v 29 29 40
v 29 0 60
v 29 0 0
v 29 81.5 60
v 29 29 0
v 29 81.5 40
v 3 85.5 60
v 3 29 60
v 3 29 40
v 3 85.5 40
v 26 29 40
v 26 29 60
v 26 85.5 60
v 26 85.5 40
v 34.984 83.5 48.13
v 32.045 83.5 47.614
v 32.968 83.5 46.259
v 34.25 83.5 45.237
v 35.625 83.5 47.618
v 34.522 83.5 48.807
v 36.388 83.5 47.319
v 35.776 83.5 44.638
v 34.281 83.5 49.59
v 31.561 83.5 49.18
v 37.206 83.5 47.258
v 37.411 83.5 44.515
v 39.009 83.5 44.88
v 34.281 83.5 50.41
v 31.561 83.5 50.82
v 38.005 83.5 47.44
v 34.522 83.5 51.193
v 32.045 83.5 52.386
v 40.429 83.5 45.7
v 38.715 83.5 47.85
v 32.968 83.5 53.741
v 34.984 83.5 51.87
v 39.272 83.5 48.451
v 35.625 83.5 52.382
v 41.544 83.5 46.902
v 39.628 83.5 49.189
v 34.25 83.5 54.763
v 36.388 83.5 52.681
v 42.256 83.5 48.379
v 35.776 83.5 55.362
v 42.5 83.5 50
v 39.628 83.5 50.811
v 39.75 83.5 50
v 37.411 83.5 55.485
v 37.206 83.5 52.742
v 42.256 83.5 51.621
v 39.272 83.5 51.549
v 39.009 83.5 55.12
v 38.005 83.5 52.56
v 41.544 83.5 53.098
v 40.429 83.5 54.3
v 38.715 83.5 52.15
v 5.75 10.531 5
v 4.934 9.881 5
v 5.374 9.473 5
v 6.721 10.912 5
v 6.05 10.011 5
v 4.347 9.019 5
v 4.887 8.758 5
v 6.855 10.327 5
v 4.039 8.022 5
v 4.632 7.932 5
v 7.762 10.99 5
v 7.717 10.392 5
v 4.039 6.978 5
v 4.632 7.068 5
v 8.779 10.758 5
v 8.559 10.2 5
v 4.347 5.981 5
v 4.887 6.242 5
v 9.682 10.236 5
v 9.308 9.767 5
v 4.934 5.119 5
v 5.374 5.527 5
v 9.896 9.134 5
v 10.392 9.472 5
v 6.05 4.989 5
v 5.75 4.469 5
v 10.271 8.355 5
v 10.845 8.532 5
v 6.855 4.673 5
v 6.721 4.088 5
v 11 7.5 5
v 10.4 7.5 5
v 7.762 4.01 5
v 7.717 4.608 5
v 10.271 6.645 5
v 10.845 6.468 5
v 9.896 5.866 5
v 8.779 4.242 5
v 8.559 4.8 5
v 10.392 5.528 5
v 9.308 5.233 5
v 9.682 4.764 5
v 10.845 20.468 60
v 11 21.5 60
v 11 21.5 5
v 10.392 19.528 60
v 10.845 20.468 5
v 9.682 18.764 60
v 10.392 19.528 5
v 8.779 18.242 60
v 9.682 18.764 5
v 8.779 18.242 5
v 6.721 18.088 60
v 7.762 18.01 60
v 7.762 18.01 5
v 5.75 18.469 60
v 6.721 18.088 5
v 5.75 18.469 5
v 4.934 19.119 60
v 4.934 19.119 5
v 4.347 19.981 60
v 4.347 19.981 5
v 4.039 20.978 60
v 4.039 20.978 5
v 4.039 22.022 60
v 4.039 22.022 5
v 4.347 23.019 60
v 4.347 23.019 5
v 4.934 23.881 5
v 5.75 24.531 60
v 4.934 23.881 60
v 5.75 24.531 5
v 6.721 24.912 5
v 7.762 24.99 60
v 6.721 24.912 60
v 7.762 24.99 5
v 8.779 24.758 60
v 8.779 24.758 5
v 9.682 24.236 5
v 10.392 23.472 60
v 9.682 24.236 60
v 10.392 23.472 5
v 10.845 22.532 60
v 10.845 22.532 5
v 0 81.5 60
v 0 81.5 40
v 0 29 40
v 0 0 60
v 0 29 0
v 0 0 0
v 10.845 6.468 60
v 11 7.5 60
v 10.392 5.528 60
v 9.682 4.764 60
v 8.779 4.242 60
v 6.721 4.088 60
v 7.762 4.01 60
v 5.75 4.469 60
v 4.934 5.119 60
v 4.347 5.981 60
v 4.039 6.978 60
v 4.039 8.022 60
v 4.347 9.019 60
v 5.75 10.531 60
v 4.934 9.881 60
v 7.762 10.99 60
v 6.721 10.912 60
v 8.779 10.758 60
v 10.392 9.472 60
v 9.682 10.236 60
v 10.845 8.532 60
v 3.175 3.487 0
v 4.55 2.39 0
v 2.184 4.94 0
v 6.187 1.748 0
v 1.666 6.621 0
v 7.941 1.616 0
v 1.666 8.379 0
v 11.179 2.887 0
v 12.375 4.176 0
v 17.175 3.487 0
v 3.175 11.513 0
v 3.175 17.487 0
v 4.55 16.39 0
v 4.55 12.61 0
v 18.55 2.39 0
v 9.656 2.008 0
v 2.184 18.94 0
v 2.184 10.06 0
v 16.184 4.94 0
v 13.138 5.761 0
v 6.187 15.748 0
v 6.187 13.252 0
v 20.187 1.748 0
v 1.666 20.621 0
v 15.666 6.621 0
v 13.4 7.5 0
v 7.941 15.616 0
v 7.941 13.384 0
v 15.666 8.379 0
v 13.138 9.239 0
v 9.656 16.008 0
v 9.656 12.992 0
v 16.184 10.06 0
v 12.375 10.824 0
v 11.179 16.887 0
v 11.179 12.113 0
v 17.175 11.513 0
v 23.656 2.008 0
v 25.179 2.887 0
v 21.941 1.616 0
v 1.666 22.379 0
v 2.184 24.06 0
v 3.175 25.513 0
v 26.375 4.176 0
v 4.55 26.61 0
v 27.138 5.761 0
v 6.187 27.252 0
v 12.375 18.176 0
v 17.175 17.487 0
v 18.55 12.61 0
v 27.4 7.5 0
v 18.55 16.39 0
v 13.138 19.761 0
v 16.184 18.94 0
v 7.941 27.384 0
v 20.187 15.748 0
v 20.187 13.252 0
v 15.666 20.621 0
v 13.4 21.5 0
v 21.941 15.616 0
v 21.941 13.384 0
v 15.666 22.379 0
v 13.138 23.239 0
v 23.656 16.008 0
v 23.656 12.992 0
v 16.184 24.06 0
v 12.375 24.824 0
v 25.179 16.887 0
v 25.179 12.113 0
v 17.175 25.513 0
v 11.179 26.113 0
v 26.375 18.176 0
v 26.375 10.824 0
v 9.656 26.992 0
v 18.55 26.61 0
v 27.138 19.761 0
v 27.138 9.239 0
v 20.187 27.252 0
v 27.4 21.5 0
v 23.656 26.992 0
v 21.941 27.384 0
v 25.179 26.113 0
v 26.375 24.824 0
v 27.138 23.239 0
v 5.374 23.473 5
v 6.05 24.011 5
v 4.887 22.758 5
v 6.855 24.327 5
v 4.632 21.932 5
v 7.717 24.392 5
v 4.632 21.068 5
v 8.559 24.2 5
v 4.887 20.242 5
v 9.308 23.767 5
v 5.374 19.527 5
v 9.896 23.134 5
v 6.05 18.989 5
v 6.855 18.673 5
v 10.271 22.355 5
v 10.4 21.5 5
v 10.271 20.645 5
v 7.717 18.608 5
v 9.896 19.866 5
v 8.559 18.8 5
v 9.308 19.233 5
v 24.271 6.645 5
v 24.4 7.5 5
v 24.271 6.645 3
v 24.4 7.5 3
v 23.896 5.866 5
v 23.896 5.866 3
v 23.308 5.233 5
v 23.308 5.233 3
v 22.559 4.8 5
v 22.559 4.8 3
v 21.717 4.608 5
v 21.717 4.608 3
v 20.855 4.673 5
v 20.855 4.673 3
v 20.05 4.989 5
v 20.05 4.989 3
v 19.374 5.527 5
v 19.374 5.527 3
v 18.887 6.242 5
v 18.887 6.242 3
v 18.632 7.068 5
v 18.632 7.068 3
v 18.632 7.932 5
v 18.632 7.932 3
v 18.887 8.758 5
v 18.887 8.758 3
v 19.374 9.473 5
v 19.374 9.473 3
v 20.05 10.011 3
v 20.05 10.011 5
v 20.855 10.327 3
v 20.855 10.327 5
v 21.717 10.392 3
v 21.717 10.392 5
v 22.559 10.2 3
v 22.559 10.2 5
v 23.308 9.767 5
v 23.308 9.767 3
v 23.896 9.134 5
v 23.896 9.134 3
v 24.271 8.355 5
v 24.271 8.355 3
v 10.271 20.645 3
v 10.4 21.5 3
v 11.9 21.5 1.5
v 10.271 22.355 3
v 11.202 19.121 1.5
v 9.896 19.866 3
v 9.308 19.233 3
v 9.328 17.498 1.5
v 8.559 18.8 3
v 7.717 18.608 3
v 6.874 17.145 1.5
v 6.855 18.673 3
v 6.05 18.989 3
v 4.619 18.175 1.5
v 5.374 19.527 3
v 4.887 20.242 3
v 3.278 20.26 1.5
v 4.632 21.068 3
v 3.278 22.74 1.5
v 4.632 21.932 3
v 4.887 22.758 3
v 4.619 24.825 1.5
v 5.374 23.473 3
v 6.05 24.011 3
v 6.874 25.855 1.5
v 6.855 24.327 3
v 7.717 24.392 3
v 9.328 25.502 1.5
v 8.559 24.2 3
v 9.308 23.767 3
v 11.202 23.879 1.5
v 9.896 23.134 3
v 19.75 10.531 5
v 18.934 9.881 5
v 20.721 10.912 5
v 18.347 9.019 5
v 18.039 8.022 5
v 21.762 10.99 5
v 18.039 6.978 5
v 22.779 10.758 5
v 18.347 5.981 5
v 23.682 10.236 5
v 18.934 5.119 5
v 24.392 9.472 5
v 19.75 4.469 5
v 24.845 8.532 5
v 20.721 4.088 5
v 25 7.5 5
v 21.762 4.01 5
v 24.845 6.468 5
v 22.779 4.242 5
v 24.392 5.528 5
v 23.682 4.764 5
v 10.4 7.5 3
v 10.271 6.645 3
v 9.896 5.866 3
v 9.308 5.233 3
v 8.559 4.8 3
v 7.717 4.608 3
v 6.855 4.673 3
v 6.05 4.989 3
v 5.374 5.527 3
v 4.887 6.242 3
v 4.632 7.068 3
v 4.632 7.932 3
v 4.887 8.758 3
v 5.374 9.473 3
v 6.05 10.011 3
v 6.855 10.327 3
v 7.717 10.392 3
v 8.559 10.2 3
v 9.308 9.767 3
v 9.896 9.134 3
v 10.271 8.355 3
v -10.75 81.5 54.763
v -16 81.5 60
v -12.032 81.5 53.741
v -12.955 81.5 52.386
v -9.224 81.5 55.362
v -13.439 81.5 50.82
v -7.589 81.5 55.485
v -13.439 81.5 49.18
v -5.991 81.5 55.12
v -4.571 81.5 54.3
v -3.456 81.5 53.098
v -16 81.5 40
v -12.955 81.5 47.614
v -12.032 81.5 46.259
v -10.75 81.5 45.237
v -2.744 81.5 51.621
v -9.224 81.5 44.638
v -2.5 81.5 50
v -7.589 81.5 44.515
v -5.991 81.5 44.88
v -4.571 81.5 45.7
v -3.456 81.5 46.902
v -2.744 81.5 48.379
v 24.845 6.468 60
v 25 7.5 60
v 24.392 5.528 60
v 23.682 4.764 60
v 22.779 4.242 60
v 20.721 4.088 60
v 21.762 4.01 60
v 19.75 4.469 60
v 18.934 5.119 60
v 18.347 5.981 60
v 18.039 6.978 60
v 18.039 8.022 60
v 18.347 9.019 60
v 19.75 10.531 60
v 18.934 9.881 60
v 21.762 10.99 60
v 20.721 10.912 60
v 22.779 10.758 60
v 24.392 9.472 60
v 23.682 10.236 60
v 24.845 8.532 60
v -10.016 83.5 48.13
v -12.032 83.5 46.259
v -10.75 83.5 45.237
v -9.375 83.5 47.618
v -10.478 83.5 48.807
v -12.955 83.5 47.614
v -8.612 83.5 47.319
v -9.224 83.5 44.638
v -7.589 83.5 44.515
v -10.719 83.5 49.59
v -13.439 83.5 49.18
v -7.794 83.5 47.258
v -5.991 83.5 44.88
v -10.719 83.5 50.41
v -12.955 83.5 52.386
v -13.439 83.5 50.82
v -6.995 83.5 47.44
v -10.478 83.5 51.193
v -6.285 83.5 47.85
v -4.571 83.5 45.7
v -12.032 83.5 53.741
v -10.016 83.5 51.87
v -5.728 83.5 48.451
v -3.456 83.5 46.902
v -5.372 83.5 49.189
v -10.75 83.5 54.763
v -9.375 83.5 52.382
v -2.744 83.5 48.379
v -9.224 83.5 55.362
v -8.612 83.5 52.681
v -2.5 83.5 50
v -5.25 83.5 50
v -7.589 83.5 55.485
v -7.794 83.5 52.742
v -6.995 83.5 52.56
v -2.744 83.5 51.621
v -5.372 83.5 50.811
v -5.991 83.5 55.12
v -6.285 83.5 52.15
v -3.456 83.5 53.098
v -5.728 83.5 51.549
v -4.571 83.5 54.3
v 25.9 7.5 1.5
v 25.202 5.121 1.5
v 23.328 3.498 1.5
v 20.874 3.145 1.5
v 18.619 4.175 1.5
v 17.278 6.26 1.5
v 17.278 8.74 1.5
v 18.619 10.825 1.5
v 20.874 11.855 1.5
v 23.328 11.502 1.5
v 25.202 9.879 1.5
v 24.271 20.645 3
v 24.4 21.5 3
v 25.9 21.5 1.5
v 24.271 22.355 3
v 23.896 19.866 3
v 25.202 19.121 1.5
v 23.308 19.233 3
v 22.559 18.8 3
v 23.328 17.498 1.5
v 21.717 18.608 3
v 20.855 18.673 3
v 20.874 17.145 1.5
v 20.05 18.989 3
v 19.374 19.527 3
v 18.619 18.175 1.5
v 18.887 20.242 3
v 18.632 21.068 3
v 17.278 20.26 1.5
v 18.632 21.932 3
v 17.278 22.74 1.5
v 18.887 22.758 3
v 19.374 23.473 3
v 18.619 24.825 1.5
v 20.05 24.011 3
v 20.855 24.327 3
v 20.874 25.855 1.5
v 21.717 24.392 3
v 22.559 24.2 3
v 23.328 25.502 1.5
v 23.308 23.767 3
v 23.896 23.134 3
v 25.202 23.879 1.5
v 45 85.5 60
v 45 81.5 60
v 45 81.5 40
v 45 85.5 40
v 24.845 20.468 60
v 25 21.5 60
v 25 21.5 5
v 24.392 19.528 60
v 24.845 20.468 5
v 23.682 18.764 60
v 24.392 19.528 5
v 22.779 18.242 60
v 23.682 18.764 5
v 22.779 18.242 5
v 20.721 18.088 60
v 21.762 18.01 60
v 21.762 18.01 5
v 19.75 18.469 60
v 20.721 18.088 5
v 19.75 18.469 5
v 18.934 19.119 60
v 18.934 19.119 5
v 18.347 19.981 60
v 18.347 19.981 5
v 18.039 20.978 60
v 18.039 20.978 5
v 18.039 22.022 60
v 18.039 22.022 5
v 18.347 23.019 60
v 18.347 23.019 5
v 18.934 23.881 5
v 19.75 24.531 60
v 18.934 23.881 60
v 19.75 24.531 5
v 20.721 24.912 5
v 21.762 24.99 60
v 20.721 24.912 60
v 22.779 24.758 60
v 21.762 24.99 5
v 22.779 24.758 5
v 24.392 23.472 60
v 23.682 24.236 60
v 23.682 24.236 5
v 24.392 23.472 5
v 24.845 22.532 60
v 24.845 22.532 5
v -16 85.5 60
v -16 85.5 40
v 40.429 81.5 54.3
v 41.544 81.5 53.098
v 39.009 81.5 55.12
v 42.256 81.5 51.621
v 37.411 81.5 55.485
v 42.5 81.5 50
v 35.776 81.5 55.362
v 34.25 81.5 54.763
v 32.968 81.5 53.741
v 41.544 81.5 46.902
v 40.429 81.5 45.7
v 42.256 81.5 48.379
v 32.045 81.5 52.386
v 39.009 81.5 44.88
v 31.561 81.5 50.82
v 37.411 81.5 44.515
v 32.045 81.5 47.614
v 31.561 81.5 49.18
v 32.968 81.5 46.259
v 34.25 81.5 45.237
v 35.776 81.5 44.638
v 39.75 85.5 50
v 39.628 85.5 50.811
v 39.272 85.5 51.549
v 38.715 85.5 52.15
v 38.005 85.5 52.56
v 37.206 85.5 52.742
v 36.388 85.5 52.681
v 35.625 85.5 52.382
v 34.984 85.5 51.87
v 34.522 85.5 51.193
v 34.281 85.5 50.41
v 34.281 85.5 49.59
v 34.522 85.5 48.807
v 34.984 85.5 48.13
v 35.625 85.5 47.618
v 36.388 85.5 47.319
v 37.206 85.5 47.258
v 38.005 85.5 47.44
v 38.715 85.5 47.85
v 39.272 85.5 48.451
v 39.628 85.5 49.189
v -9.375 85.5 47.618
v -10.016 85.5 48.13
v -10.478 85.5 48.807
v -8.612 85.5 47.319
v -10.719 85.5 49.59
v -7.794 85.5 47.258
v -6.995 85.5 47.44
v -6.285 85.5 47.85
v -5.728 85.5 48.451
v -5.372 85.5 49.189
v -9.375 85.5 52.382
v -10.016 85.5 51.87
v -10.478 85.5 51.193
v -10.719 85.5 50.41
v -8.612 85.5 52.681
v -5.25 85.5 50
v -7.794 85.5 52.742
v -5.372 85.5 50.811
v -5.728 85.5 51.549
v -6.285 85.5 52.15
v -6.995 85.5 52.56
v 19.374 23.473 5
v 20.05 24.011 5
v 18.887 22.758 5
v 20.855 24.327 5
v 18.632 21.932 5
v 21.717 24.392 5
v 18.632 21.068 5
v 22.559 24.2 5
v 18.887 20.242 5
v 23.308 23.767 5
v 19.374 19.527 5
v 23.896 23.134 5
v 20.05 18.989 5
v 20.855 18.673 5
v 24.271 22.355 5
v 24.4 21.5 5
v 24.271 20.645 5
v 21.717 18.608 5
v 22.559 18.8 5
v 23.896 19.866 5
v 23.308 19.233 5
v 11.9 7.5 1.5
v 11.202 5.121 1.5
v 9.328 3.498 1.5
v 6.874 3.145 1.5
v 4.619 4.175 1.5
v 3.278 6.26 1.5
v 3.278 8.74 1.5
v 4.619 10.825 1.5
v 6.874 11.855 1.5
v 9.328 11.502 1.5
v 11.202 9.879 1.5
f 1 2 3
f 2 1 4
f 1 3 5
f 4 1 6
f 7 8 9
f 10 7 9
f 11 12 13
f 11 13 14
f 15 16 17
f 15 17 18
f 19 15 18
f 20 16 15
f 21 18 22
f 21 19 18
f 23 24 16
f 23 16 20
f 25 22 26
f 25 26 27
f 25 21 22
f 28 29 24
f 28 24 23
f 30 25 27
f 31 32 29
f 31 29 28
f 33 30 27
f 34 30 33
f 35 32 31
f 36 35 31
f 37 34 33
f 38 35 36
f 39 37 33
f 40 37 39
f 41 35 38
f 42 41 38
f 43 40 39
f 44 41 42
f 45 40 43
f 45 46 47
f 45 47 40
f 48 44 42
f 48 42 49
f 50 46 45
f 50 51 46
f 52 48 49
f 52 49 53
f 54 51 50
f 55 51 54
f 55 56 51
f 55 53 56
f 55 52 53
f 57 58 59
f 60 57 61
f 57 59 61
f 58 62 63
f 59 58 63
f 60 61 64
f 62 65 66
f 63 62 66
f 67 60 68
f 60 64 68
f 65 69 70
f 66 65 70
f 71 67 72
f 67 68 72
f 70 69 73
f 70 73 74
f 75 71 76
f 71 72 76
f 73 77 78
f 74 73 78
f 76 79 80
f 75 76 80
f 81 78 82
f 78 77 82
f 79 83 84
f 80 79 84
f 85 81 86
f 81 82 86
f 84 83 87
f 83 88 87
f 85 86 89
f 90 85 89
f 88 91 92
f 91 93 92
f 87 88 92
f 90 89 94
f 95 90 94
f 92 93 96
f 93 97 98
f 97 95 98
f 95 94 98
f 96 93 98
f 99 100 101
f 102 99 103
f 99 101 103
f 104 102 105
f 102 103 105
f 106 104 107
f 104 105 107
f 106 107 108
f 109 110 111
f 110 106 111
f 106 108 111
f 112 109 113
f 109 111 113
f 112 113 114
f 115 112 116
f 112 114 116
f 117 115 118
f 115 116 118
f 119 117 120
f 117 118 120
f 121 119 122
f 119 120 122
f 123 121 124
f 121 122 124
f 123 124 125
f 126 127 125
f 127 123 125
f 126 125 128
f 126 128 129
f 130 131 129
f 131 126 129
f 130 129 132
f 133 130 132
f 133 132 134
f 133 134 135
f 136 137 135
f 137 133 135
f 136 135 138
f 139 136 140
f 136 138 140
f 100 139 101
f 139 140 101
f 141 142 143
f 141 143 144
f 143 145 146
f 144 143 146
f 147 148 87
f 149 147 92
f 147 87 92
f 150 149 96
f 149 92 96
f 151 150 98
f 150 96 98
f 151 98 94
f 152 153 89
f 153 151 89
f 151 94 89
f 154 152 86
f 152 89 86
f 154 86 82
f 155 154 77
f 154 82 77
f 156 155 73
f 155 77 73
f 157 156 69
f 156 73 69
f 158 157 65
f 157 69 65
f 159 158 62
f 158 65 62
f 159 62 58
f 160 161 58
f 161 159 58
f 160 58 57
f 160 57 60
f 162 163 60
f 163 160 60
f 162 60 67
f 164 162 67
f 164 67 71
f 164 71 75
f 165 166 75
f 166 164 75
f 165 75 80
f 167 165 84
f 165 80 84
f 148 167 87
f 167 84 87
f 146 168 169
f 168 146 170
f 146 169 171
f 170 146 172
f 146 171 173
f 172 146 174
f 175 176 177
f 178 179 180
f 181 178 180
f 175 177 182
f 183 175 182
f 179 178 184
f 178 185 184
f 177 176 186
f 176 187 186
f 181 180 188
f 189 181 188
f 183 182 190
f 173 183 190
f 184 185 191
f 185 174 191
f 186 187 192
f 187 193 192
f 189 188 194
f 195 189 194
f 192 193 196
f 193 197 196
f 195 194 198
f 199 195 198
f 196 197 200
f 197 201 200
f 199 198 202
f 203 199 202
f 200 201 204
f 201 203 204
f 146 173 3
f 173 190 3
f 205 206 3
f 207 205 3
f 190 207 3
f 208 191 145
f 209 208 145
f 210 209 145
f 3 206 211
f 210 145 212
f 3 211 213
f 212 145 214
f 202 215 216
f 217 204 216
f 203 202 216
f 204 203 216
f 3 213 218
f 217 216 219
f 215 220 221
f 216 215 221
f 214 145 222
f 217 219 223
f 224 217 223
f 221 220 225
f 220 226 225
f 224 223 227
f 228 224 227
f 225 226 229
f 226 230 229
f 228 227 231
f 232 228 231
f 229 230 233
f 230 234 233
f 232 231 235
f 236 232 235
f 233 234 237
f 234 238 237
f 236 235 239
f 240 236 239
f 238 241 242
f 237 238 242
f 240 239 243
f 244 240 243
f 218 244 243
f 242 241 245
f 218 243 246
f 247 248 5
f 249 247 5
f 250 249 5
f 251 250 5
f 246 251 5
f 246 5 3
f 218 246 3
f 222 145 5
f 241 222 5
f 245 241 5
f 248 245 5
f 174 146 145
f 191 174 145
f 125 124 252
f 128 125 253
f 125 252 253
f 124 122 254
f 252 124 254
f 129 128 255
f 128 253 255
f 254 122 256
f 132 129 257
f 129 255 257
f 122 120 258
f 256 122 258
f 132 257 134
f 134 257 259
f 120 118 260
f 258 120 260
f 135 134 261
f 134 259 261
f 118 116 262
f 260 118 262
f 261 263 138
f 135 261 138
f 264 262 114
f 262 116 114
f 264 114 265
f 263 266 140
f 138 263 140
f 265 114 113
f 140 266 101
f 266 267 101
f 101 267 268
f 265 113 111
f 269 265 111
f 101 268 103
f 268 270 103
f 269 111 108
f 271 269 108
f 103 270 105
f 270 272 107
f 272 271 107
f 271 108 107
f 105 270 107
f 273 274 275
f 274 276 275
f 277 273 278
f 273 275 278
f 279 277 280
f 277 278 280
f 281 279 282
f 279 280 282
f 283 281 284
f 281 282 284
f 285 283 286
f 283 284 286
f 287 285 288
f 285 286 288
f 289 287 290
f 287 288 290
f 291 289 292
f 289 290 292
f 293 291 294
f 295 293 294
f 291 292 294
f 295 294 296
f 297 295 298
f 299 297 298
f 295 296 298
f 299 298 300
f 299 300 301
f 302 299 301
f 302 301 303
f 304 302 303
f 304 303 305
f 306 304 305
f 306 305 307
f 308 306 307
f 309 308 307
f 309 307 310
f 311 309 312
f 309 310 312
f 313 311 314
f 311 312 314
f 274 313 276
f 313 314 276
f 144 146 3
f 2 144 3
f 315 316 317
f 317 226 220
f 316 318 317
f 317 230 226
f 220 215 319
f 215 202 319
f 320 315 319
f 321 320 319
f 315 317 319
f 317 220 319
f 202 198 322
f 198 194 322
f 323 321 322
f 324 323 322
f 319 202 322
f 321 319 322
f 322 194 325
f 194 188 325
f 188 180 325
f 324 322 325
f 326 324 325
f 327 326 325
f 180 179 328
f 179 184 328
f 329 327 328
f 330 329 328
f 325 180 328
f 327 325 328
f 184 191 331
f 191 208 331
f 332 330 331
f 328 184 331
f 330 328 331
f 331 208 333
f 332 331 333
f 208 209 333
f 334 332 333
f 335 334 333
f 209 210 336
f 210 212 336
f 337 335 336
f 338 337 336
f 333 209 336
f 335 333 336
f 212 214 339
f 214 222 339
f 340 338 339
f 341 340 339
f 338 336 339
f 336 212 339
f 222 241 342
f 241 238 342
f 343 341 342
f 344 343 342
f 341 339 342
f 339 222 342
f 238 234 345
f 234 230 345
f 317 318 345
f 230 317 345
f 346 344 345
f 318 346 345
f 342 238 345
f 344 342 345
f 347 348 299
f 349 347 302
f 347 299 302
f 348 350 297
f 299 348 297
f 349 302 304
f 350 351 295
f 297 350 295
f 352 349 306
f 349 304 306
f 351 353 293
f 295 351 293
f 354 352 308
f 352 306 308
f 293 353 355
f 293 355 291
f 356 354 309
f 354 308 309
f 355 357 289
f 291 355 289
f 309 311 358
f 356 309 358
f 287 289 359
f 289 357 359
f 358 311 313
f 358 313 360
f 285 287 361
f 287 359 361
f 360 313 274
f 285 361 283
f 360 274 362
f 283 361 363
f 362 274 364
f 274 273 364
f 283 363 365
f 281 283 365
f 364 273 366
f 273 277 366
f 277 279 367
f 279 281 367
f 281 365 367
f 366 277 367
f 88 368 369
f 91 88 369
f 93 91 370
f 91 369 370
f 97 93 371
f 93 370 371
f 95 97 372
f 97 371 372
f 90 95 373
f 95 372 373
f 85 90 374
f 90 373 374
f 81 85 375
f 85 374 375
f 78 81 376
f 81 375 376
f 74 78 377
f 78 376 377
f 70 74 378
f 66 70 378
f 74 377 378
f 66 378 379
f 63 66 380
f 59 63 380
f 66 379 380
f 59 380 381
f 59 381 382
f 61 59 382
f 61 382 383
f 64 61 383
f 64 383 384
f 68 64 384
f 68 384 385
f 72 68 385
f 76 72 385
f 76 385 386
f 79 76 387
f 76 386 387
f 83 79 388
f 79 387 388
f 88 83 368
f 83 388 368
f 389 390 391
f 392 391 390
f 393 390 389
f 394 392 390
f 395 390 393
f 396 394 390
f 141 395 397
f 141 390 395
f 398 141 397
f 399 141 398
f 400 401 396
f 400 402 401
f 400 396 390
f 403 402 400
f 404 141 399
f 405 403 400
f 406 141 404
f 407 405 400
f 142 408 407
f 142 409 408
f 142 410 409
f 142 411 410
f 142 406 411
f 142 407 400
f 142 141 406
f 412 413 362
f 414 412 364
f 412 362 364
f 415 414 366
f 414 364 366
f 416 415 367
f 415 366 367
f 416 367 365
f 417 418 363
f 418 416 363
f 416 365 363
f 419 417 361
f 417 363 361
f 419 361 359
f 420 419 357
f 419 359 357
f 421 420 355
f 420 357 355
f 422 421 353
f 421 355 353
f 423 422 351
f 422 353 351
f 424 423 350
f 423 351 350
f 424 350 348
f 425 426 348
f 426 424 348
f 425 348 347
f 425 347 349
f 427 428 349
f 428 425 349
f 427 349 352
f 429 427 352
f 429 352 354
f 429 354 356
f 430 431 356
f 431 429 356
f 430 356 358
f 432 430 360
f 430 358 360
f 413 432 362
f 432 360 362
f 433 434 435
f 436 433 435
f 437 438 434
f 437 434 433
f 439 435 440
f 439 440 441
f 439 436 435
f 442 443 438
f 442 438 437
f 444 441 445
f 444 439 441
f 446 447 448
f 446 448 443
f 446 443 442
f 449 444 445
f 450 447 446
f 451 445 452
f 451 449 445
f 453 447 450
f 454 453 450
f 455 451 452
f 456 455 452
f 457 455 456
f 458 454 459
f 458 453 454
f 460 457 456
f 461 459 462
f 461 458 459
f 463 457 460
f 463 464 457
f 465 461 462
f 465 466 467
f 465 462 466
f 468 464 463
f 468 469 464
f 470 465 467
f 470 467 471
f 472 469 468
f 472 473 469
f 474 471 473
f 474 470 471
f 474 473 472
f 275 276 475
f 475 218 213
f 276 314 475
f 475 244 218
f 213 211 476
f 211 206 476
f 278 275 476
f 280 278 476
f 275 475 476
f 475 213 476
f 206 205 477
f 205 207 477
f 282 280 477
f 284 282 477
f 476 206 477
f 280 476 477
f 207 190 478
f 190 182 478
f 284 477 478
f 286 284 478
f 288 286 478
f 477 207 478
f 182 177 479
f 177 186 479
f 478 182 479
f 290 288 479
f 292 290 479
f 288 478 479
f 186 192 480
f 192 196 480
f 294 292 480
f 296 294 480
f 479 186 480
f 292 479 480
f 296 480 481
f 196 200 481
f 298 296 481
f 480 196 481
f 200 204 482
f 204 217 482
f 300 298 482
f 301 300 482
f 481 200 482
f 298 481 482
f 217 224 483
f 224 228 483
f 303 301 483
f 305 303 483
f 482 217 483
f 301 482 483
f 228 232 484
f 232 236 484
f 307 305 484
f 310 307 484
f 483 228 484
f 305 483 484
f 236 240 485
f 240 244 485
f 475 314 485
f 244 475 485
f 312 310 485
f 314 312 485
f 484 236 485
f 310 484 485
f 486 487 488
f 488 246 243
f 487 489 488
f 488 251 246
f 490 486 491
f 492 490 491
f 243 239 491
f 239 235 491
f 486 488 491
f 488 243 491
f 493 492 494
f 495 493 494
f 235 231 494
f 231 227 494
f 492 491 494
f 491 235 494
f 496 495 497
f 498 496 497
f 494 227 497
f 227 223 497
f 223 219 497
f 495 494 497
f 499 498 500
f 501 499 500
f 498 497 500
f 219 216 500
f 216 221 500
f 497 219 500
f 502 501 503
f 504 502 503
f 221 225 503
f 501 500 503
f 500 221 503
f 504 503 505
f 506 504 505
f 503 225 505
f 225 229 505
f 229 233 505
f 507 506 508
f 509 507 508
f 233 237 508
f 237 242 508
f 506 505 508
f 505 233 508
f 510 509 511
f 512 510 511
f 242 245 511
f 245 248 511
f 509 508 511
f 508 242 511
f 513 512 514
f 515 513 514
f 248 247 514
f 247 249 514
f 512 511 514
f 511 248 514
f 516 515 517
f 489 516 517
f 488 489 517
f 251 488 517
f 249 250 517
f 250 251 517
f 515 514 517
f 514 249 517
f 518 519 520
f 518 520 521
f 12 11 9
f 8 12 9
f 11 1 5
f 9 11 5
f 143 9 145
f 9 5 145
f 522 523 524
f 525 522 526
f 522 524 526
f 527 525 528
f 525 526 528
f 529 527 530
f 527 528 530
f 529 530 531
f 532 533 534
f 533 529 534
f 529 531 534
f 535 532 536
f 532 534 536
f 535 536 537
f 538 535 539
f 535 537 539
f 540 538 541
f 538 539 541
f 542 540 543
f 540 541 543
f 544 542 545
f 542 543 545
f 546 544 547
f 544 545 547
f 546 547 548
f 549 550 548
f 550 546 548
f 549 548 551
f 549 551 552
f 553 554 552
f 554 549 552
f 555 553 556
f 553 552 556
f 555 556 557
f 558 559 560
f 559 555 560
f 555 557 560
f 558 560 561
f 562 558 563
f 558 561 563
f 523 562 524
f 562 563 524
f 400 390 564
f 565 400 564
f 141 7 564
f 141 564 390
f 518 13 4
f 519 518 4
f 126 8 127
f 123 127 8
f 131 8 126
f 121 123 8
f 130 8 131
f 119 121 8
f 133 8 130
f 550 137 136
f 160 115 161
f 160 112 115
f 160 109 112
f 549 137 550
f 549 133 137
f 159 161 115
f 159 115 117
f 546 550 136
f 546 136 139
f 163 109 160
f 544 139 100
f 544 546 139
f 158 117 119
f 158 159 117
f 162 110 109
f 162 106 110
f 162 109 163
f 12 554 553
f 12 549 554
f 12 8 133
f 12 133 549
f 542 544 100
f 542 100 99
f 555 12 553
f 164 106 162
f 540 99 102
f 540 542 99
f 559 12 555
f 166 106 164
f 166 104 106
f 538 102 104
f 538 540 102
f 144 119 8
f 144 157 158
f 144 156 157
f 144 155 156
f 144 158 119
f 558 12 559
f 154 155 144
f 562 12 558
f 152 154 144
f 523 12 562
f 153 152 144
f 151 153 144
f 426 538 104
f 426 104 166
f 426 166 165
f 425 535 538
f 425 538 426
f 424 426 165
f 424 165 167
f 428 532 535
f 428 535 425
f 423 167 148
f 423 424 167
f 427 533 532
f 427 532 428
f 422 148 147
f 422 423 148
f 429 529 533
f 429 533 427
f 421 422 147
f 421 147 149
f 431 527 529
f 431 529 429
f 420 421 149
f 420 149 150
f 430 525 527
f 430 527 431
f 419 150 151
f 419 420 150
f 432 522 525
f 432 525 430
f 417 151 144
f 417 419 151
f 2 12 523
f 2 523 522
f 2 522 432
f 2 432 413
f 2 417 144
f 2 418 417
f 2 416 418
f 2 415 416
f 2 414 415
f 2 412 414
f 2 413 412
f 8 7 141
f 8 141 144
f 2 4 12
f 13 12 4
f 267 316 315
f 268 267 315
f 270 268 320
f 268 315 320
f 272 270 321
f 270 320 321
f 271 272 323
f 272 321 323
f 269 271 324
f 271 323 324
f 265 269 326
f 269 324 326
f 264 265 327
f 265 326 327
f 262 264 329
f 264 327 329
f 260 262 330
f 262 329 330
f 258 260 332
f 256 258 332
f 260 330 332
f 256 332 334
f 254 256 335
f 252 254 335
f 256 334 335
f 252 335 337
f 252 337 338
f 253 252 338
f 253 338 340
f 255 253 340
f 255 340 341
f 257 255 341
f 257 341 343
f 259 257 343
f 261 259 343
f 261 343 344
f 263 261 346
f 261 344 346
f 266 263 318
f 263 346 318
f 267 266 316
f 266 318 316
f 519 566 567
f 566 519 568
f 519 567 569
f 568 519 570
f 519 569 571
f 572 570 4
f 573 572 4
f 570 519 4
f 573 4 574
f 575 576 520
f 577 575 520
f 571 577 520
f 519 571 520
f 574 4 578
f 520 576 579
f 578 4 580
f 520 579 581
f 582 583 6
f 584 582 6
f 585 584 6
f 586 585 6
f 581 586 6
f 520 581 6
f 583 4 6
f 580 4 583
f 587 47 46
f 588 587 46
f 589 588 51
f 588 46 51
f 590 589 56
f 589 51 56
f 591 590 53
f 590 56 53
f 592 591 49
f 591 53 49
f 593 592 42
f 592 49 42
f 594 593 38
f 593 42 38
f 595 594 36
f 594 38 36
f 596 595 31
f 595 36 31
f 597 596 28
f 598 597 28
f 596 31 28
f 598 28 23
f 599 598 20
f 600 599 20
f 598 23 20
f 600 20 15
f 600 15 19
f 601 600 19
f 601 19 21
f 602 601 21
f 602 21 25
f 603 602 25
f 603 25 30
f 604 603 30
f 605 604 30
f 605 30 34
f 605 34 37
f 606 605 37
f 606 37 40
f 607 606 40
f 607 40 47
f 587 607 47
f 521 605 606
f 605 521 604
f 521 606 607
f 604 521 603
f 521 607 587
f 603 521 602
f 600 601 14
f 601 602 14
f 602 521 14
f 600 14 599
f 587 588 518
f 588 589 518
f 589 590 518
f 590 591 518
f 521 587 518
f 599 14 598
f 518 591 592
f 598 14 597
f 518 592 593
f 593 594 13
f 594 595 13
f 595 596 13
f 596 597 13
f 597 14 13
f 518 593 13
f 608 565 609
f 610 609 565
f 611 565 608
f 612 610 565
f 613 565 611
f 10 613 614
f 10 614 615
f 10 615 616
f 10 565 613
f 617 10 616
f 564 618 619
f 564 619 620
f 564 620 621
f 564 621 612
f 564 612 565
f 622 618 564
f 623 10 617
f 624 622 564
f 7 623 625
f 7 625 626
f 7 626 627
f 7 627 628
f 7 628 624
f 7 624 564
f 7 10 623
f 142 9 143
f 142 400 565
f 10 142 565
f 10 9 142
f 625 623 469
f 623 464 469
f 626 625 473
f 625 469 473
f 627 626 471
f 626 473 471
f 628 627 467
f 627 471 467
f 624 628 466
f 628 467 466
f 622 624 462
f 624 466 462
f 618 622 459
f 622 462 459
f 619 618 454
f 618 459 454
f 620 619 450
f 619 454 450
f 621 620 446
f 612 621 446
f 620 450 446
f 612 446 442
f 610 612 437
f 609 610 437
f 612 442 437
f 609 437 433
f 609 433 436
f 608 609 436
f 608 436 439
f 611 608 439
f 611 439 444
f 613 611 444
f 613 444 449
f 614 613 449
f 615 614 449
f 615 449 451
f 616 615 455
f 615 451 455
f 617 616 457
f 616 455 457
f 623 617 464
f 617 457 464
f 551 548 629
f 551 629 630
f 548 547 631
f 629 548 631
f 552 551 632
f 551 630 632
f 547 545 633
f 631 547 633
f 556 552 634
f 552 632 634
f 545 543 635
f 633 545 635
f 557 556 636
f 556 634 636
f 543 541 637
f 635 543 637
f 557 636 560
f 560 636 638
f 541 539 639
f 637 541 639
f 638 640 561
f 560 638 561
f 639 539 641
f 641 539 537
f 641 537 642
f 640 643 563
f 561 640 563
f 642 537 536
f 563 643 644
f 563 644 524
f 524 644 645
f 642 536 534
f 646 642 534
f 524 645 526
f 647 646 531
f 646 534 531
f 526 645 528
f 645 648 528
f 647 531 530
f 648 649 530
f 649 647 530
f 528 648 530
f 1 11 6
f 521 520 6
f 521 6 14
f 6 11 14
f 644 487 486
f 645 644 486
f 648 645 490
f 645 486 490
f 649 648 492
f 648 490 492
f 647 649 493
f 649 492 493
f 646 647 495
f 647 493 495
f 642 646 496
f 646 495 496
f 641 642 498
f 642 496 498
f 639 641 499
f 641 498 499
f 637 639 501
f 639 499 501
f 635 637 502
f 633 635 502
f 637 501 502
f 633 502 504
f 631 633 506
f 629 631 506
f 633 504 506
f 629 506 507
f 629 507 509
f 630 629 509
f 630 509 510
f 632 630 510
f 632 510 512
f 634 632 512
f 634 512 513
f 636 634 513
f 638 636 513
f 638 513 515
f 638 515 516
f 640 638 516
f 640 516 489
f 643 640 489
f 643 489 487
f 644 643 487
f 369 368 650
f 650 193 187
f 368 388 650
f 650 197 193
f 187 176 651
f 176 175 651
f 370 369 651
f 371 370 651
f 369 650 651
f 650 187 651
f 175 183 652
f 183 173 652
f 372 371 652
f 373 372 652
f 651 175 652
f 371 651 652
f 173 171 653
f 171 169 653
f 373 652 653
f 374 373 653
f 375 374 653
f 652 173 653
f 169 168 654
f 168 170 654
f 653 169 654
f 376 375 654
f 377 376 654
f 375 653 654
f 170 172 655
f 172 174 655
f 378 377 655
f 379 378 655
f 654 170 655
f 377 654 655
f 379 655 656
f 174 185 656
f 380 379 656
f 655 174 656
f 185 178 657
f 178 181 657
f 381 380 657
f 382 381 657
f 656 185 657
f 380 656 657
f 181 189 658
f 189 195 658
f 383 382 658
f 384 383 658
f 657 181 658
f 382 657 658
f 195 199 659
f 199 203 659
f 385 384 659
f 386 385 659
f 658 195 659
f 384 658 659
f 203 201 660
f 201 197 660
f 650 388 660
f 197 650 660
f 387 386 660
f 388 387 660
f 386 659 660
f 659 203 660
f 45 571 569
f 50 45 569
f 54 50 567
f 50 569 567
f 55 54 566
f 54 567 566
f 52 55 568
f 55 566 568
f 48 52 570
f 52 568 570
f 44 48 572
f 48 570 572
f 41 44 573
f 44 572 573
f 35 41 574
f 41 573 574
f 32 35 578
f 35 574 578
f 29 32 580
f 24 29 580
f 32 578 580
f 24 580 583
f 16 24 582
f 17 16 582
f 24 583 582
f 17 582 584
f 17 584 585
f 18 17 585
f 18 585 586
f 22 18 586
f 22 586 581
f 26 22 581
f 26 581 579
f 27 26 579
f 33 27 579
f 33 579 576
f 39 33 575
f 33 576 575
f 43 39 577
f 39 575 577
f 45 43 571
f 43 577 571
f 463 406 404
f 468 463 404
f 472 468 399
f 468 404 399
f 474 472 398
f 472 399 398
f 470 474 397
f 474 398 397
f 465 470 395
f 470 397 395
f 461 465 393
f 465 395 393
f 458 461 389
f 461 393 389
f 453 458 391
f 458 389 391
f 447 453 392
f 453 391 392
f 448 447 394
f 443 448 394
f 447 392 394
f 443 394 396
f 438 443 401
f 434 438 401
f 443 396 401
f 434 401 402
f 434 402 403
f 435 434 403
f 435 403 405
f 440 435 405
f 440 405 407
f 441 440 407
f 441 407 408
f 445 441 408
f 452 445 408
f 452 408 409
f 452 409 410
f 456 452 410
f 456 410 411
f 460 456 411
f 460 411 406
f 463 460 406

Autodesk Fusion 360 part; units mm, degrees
sketch "Sketch1" plane through (0, 0, 0) normal (0, 0, 1) x (1, 0, 0) in component "Halterung"
  line L0 (0, 0) -> (29, 0)
  line L1 (29, 0) -> (29, 29)
  line L2 (29, 29) -> (0, 29)
  line L3 (0, 29) -> (0, 0)
  circle A0 centre (7.5, 7.5) radius 3.5
  circle A1 centre (21.5, 7.5) radius 3.5
  circle A2 centre (7.5, 21.5) radius 3.5
  circle A3 centre (21.5, 21.5) radius 3.5
  dimension "d1" = 7
  dimension "d3" = 4
  dimension "d6" = 7
  dimension "d7" = 4
  dimension "d8" = 7
  dimension "d9" = 4
  dimension "d10" = 4
  dimension "d15" = 35
extrude "Extrude1" add sketch "Sketch1" along normal blind 60 in component "Halterung"
sketch "Sketch2" plane through (0, 29, 0) normal (0, 1, 0) x (-1, 0, 0) in component "Halterung"
  line L0 (-29, 0) -> (0, 0)
  line L1 (0, 0) -> (0, 60)
  line L2 (0, 60) -> (-29, 60)
  line L3 (-29, 60) -> (-29, 0)
  line L4 (-29, 60) -> (-26, 60)
  line L5 (-26, 60) -> (-26, 40)
  line L6 (-26, 40) -> (-29, 40)
  line L7 (-29, 40) -> (-29, 60)
  line L8 (-14.5, 60) -> (-14.5, 0) construction
  line L9 (-3, 60) -> (-3, 40)
  line L10 (0, 60) -> (-3, 60)
  line L11 (0, 40) -> (0, 60)
  line L12 (-3, 40) -> (0, 40)
  dimension "d13" = 3
  dimension "d14" = 20
extrude "Extrude2" add sketch "Sketch2" along normal blind 56.5 contours L2 L3 L4 L5 L6 L7 | L1 L2 L9 L10 L11 L12 in component "Halterung"
sketch "Sketch3" plane through (29, 0, 0) normal (1, 0, 0) x (0, 1, 0) in component "Halterung"
  line L0 (0, 0) -> (29, 0)
  line L1 (29, 0) -> (29, 40)
  line L2 (29, 40) -> (85.5, 40)
  line L3 (85.5, 40) -> (85.5, 60)
  line L4 (85.5, 60) -> (0, 60)
  line L5 (0, 60) -> (0, 0)
  line L6 (85.5, 60) -> (81.5, 60)
  line L7 (81.5, 60) -> (81.5, 40)
  line L8 (81.5, 40) -> (85.5, 40)
  line L9 (85.5, 40) -> (85.5, 60)
  dimension "d18" = 4
extrude "Extrude3" add sketch "Sketch3" along normal blind 16 contours L2 L3 L4 L6 L7 L8 L9 in component "Halterung"
extrude "Extrude4" add sketch "Sketch3" against normal blind 16 from surface at -29 contours L2 L3 L4 L6 L7 L8 L9 in component "Halterung"
sketch "Sketch4" plane through (0, 81.5, 0) normal (0, -1, 0) x (1, 0, 0) in component "Halterung"
  line L0 (29, 60) -> (29, 40)
  line L1 (29, 40) -> (45, 40)
  line L2 (45, 40) -> (45, 60)
  line L3 (45, 60) -> (29, 60)
  circle A0 centre (37, 50) radius 5.5
  line L4 (45, 50) -> (29, 50) construction
  line L5 (37, 60) -> (37, 40) construction
  line L6 (14.5, 0) -> (14.5, 60) construction
  line L7 (0, 60) -> (29, 60)
  line L8 (0, 0) -> (29, 0)
  circle A1 centre (37, 50) radius 2.75
  circle A2 centre (-8, 50) radius 5.5
  circle A3 centre (-8, 50) radius 2.75
  point P0 (37, 50)
  dimension "d24" = 11
  dimension "d25" = 5.5
extrude "Extrude5" cut sketch "Sketch4" against normal up to surface (4 mm away) contours A1 | A3 in component "Halterung"
extrude "Extrude6" cut sketch "Sketch4" against normal blind 2 contours A0 | A2 in component "Halterung"
sketch "Sketch1 (2)" plane through (0, 0, 0) normal (0, 0, -1) x (1, 0, 0)
  line L0 (0, 0) -> (0, -29)
  line L1 (0, -29) -> (29, -29)
  line L2 (29, -29) -> (29, 0)
  line L3 (29, 0) -> (0, 0)
  circle A0 centre (7.5, -7.5) radius 2.9
  circle A1 centre (21.5, -7.5) radius 2.9
  circle A2 centre (7.5, -21.5) radius 2.9
  circle A3 centre (21.5, -21.5) radius 2.9
  circle A4 centre (21.5, -21.5) radius 3.5
  circle A5 centre (7.5, -21.5) radius 3.5
  circle A6 centre (21.5, -7.5) radius 3.5
  circle A7 centre (7.5, -7.5) radius 3.5
  dimension "d52" = 5.8
extrude "Extrude9" add sketch "Sketch1 (2)" against normal blind 5 contours A4 | A5 | A6 | A7 in component "Halterung"
chamfer "Chamfer2" distance 3 angle 45 4 edges at (4.7963, 20.4513, 0) (18.7963, 20.4513, 0) (18.7963, 6.4513, 0) (4.7963, 6.4513, 0) in component "Halterung"
component "Halterung" placed x (1, 0, 0) y (0, 1, 0) z (0, 0, 1) at (0, 0, 0)
